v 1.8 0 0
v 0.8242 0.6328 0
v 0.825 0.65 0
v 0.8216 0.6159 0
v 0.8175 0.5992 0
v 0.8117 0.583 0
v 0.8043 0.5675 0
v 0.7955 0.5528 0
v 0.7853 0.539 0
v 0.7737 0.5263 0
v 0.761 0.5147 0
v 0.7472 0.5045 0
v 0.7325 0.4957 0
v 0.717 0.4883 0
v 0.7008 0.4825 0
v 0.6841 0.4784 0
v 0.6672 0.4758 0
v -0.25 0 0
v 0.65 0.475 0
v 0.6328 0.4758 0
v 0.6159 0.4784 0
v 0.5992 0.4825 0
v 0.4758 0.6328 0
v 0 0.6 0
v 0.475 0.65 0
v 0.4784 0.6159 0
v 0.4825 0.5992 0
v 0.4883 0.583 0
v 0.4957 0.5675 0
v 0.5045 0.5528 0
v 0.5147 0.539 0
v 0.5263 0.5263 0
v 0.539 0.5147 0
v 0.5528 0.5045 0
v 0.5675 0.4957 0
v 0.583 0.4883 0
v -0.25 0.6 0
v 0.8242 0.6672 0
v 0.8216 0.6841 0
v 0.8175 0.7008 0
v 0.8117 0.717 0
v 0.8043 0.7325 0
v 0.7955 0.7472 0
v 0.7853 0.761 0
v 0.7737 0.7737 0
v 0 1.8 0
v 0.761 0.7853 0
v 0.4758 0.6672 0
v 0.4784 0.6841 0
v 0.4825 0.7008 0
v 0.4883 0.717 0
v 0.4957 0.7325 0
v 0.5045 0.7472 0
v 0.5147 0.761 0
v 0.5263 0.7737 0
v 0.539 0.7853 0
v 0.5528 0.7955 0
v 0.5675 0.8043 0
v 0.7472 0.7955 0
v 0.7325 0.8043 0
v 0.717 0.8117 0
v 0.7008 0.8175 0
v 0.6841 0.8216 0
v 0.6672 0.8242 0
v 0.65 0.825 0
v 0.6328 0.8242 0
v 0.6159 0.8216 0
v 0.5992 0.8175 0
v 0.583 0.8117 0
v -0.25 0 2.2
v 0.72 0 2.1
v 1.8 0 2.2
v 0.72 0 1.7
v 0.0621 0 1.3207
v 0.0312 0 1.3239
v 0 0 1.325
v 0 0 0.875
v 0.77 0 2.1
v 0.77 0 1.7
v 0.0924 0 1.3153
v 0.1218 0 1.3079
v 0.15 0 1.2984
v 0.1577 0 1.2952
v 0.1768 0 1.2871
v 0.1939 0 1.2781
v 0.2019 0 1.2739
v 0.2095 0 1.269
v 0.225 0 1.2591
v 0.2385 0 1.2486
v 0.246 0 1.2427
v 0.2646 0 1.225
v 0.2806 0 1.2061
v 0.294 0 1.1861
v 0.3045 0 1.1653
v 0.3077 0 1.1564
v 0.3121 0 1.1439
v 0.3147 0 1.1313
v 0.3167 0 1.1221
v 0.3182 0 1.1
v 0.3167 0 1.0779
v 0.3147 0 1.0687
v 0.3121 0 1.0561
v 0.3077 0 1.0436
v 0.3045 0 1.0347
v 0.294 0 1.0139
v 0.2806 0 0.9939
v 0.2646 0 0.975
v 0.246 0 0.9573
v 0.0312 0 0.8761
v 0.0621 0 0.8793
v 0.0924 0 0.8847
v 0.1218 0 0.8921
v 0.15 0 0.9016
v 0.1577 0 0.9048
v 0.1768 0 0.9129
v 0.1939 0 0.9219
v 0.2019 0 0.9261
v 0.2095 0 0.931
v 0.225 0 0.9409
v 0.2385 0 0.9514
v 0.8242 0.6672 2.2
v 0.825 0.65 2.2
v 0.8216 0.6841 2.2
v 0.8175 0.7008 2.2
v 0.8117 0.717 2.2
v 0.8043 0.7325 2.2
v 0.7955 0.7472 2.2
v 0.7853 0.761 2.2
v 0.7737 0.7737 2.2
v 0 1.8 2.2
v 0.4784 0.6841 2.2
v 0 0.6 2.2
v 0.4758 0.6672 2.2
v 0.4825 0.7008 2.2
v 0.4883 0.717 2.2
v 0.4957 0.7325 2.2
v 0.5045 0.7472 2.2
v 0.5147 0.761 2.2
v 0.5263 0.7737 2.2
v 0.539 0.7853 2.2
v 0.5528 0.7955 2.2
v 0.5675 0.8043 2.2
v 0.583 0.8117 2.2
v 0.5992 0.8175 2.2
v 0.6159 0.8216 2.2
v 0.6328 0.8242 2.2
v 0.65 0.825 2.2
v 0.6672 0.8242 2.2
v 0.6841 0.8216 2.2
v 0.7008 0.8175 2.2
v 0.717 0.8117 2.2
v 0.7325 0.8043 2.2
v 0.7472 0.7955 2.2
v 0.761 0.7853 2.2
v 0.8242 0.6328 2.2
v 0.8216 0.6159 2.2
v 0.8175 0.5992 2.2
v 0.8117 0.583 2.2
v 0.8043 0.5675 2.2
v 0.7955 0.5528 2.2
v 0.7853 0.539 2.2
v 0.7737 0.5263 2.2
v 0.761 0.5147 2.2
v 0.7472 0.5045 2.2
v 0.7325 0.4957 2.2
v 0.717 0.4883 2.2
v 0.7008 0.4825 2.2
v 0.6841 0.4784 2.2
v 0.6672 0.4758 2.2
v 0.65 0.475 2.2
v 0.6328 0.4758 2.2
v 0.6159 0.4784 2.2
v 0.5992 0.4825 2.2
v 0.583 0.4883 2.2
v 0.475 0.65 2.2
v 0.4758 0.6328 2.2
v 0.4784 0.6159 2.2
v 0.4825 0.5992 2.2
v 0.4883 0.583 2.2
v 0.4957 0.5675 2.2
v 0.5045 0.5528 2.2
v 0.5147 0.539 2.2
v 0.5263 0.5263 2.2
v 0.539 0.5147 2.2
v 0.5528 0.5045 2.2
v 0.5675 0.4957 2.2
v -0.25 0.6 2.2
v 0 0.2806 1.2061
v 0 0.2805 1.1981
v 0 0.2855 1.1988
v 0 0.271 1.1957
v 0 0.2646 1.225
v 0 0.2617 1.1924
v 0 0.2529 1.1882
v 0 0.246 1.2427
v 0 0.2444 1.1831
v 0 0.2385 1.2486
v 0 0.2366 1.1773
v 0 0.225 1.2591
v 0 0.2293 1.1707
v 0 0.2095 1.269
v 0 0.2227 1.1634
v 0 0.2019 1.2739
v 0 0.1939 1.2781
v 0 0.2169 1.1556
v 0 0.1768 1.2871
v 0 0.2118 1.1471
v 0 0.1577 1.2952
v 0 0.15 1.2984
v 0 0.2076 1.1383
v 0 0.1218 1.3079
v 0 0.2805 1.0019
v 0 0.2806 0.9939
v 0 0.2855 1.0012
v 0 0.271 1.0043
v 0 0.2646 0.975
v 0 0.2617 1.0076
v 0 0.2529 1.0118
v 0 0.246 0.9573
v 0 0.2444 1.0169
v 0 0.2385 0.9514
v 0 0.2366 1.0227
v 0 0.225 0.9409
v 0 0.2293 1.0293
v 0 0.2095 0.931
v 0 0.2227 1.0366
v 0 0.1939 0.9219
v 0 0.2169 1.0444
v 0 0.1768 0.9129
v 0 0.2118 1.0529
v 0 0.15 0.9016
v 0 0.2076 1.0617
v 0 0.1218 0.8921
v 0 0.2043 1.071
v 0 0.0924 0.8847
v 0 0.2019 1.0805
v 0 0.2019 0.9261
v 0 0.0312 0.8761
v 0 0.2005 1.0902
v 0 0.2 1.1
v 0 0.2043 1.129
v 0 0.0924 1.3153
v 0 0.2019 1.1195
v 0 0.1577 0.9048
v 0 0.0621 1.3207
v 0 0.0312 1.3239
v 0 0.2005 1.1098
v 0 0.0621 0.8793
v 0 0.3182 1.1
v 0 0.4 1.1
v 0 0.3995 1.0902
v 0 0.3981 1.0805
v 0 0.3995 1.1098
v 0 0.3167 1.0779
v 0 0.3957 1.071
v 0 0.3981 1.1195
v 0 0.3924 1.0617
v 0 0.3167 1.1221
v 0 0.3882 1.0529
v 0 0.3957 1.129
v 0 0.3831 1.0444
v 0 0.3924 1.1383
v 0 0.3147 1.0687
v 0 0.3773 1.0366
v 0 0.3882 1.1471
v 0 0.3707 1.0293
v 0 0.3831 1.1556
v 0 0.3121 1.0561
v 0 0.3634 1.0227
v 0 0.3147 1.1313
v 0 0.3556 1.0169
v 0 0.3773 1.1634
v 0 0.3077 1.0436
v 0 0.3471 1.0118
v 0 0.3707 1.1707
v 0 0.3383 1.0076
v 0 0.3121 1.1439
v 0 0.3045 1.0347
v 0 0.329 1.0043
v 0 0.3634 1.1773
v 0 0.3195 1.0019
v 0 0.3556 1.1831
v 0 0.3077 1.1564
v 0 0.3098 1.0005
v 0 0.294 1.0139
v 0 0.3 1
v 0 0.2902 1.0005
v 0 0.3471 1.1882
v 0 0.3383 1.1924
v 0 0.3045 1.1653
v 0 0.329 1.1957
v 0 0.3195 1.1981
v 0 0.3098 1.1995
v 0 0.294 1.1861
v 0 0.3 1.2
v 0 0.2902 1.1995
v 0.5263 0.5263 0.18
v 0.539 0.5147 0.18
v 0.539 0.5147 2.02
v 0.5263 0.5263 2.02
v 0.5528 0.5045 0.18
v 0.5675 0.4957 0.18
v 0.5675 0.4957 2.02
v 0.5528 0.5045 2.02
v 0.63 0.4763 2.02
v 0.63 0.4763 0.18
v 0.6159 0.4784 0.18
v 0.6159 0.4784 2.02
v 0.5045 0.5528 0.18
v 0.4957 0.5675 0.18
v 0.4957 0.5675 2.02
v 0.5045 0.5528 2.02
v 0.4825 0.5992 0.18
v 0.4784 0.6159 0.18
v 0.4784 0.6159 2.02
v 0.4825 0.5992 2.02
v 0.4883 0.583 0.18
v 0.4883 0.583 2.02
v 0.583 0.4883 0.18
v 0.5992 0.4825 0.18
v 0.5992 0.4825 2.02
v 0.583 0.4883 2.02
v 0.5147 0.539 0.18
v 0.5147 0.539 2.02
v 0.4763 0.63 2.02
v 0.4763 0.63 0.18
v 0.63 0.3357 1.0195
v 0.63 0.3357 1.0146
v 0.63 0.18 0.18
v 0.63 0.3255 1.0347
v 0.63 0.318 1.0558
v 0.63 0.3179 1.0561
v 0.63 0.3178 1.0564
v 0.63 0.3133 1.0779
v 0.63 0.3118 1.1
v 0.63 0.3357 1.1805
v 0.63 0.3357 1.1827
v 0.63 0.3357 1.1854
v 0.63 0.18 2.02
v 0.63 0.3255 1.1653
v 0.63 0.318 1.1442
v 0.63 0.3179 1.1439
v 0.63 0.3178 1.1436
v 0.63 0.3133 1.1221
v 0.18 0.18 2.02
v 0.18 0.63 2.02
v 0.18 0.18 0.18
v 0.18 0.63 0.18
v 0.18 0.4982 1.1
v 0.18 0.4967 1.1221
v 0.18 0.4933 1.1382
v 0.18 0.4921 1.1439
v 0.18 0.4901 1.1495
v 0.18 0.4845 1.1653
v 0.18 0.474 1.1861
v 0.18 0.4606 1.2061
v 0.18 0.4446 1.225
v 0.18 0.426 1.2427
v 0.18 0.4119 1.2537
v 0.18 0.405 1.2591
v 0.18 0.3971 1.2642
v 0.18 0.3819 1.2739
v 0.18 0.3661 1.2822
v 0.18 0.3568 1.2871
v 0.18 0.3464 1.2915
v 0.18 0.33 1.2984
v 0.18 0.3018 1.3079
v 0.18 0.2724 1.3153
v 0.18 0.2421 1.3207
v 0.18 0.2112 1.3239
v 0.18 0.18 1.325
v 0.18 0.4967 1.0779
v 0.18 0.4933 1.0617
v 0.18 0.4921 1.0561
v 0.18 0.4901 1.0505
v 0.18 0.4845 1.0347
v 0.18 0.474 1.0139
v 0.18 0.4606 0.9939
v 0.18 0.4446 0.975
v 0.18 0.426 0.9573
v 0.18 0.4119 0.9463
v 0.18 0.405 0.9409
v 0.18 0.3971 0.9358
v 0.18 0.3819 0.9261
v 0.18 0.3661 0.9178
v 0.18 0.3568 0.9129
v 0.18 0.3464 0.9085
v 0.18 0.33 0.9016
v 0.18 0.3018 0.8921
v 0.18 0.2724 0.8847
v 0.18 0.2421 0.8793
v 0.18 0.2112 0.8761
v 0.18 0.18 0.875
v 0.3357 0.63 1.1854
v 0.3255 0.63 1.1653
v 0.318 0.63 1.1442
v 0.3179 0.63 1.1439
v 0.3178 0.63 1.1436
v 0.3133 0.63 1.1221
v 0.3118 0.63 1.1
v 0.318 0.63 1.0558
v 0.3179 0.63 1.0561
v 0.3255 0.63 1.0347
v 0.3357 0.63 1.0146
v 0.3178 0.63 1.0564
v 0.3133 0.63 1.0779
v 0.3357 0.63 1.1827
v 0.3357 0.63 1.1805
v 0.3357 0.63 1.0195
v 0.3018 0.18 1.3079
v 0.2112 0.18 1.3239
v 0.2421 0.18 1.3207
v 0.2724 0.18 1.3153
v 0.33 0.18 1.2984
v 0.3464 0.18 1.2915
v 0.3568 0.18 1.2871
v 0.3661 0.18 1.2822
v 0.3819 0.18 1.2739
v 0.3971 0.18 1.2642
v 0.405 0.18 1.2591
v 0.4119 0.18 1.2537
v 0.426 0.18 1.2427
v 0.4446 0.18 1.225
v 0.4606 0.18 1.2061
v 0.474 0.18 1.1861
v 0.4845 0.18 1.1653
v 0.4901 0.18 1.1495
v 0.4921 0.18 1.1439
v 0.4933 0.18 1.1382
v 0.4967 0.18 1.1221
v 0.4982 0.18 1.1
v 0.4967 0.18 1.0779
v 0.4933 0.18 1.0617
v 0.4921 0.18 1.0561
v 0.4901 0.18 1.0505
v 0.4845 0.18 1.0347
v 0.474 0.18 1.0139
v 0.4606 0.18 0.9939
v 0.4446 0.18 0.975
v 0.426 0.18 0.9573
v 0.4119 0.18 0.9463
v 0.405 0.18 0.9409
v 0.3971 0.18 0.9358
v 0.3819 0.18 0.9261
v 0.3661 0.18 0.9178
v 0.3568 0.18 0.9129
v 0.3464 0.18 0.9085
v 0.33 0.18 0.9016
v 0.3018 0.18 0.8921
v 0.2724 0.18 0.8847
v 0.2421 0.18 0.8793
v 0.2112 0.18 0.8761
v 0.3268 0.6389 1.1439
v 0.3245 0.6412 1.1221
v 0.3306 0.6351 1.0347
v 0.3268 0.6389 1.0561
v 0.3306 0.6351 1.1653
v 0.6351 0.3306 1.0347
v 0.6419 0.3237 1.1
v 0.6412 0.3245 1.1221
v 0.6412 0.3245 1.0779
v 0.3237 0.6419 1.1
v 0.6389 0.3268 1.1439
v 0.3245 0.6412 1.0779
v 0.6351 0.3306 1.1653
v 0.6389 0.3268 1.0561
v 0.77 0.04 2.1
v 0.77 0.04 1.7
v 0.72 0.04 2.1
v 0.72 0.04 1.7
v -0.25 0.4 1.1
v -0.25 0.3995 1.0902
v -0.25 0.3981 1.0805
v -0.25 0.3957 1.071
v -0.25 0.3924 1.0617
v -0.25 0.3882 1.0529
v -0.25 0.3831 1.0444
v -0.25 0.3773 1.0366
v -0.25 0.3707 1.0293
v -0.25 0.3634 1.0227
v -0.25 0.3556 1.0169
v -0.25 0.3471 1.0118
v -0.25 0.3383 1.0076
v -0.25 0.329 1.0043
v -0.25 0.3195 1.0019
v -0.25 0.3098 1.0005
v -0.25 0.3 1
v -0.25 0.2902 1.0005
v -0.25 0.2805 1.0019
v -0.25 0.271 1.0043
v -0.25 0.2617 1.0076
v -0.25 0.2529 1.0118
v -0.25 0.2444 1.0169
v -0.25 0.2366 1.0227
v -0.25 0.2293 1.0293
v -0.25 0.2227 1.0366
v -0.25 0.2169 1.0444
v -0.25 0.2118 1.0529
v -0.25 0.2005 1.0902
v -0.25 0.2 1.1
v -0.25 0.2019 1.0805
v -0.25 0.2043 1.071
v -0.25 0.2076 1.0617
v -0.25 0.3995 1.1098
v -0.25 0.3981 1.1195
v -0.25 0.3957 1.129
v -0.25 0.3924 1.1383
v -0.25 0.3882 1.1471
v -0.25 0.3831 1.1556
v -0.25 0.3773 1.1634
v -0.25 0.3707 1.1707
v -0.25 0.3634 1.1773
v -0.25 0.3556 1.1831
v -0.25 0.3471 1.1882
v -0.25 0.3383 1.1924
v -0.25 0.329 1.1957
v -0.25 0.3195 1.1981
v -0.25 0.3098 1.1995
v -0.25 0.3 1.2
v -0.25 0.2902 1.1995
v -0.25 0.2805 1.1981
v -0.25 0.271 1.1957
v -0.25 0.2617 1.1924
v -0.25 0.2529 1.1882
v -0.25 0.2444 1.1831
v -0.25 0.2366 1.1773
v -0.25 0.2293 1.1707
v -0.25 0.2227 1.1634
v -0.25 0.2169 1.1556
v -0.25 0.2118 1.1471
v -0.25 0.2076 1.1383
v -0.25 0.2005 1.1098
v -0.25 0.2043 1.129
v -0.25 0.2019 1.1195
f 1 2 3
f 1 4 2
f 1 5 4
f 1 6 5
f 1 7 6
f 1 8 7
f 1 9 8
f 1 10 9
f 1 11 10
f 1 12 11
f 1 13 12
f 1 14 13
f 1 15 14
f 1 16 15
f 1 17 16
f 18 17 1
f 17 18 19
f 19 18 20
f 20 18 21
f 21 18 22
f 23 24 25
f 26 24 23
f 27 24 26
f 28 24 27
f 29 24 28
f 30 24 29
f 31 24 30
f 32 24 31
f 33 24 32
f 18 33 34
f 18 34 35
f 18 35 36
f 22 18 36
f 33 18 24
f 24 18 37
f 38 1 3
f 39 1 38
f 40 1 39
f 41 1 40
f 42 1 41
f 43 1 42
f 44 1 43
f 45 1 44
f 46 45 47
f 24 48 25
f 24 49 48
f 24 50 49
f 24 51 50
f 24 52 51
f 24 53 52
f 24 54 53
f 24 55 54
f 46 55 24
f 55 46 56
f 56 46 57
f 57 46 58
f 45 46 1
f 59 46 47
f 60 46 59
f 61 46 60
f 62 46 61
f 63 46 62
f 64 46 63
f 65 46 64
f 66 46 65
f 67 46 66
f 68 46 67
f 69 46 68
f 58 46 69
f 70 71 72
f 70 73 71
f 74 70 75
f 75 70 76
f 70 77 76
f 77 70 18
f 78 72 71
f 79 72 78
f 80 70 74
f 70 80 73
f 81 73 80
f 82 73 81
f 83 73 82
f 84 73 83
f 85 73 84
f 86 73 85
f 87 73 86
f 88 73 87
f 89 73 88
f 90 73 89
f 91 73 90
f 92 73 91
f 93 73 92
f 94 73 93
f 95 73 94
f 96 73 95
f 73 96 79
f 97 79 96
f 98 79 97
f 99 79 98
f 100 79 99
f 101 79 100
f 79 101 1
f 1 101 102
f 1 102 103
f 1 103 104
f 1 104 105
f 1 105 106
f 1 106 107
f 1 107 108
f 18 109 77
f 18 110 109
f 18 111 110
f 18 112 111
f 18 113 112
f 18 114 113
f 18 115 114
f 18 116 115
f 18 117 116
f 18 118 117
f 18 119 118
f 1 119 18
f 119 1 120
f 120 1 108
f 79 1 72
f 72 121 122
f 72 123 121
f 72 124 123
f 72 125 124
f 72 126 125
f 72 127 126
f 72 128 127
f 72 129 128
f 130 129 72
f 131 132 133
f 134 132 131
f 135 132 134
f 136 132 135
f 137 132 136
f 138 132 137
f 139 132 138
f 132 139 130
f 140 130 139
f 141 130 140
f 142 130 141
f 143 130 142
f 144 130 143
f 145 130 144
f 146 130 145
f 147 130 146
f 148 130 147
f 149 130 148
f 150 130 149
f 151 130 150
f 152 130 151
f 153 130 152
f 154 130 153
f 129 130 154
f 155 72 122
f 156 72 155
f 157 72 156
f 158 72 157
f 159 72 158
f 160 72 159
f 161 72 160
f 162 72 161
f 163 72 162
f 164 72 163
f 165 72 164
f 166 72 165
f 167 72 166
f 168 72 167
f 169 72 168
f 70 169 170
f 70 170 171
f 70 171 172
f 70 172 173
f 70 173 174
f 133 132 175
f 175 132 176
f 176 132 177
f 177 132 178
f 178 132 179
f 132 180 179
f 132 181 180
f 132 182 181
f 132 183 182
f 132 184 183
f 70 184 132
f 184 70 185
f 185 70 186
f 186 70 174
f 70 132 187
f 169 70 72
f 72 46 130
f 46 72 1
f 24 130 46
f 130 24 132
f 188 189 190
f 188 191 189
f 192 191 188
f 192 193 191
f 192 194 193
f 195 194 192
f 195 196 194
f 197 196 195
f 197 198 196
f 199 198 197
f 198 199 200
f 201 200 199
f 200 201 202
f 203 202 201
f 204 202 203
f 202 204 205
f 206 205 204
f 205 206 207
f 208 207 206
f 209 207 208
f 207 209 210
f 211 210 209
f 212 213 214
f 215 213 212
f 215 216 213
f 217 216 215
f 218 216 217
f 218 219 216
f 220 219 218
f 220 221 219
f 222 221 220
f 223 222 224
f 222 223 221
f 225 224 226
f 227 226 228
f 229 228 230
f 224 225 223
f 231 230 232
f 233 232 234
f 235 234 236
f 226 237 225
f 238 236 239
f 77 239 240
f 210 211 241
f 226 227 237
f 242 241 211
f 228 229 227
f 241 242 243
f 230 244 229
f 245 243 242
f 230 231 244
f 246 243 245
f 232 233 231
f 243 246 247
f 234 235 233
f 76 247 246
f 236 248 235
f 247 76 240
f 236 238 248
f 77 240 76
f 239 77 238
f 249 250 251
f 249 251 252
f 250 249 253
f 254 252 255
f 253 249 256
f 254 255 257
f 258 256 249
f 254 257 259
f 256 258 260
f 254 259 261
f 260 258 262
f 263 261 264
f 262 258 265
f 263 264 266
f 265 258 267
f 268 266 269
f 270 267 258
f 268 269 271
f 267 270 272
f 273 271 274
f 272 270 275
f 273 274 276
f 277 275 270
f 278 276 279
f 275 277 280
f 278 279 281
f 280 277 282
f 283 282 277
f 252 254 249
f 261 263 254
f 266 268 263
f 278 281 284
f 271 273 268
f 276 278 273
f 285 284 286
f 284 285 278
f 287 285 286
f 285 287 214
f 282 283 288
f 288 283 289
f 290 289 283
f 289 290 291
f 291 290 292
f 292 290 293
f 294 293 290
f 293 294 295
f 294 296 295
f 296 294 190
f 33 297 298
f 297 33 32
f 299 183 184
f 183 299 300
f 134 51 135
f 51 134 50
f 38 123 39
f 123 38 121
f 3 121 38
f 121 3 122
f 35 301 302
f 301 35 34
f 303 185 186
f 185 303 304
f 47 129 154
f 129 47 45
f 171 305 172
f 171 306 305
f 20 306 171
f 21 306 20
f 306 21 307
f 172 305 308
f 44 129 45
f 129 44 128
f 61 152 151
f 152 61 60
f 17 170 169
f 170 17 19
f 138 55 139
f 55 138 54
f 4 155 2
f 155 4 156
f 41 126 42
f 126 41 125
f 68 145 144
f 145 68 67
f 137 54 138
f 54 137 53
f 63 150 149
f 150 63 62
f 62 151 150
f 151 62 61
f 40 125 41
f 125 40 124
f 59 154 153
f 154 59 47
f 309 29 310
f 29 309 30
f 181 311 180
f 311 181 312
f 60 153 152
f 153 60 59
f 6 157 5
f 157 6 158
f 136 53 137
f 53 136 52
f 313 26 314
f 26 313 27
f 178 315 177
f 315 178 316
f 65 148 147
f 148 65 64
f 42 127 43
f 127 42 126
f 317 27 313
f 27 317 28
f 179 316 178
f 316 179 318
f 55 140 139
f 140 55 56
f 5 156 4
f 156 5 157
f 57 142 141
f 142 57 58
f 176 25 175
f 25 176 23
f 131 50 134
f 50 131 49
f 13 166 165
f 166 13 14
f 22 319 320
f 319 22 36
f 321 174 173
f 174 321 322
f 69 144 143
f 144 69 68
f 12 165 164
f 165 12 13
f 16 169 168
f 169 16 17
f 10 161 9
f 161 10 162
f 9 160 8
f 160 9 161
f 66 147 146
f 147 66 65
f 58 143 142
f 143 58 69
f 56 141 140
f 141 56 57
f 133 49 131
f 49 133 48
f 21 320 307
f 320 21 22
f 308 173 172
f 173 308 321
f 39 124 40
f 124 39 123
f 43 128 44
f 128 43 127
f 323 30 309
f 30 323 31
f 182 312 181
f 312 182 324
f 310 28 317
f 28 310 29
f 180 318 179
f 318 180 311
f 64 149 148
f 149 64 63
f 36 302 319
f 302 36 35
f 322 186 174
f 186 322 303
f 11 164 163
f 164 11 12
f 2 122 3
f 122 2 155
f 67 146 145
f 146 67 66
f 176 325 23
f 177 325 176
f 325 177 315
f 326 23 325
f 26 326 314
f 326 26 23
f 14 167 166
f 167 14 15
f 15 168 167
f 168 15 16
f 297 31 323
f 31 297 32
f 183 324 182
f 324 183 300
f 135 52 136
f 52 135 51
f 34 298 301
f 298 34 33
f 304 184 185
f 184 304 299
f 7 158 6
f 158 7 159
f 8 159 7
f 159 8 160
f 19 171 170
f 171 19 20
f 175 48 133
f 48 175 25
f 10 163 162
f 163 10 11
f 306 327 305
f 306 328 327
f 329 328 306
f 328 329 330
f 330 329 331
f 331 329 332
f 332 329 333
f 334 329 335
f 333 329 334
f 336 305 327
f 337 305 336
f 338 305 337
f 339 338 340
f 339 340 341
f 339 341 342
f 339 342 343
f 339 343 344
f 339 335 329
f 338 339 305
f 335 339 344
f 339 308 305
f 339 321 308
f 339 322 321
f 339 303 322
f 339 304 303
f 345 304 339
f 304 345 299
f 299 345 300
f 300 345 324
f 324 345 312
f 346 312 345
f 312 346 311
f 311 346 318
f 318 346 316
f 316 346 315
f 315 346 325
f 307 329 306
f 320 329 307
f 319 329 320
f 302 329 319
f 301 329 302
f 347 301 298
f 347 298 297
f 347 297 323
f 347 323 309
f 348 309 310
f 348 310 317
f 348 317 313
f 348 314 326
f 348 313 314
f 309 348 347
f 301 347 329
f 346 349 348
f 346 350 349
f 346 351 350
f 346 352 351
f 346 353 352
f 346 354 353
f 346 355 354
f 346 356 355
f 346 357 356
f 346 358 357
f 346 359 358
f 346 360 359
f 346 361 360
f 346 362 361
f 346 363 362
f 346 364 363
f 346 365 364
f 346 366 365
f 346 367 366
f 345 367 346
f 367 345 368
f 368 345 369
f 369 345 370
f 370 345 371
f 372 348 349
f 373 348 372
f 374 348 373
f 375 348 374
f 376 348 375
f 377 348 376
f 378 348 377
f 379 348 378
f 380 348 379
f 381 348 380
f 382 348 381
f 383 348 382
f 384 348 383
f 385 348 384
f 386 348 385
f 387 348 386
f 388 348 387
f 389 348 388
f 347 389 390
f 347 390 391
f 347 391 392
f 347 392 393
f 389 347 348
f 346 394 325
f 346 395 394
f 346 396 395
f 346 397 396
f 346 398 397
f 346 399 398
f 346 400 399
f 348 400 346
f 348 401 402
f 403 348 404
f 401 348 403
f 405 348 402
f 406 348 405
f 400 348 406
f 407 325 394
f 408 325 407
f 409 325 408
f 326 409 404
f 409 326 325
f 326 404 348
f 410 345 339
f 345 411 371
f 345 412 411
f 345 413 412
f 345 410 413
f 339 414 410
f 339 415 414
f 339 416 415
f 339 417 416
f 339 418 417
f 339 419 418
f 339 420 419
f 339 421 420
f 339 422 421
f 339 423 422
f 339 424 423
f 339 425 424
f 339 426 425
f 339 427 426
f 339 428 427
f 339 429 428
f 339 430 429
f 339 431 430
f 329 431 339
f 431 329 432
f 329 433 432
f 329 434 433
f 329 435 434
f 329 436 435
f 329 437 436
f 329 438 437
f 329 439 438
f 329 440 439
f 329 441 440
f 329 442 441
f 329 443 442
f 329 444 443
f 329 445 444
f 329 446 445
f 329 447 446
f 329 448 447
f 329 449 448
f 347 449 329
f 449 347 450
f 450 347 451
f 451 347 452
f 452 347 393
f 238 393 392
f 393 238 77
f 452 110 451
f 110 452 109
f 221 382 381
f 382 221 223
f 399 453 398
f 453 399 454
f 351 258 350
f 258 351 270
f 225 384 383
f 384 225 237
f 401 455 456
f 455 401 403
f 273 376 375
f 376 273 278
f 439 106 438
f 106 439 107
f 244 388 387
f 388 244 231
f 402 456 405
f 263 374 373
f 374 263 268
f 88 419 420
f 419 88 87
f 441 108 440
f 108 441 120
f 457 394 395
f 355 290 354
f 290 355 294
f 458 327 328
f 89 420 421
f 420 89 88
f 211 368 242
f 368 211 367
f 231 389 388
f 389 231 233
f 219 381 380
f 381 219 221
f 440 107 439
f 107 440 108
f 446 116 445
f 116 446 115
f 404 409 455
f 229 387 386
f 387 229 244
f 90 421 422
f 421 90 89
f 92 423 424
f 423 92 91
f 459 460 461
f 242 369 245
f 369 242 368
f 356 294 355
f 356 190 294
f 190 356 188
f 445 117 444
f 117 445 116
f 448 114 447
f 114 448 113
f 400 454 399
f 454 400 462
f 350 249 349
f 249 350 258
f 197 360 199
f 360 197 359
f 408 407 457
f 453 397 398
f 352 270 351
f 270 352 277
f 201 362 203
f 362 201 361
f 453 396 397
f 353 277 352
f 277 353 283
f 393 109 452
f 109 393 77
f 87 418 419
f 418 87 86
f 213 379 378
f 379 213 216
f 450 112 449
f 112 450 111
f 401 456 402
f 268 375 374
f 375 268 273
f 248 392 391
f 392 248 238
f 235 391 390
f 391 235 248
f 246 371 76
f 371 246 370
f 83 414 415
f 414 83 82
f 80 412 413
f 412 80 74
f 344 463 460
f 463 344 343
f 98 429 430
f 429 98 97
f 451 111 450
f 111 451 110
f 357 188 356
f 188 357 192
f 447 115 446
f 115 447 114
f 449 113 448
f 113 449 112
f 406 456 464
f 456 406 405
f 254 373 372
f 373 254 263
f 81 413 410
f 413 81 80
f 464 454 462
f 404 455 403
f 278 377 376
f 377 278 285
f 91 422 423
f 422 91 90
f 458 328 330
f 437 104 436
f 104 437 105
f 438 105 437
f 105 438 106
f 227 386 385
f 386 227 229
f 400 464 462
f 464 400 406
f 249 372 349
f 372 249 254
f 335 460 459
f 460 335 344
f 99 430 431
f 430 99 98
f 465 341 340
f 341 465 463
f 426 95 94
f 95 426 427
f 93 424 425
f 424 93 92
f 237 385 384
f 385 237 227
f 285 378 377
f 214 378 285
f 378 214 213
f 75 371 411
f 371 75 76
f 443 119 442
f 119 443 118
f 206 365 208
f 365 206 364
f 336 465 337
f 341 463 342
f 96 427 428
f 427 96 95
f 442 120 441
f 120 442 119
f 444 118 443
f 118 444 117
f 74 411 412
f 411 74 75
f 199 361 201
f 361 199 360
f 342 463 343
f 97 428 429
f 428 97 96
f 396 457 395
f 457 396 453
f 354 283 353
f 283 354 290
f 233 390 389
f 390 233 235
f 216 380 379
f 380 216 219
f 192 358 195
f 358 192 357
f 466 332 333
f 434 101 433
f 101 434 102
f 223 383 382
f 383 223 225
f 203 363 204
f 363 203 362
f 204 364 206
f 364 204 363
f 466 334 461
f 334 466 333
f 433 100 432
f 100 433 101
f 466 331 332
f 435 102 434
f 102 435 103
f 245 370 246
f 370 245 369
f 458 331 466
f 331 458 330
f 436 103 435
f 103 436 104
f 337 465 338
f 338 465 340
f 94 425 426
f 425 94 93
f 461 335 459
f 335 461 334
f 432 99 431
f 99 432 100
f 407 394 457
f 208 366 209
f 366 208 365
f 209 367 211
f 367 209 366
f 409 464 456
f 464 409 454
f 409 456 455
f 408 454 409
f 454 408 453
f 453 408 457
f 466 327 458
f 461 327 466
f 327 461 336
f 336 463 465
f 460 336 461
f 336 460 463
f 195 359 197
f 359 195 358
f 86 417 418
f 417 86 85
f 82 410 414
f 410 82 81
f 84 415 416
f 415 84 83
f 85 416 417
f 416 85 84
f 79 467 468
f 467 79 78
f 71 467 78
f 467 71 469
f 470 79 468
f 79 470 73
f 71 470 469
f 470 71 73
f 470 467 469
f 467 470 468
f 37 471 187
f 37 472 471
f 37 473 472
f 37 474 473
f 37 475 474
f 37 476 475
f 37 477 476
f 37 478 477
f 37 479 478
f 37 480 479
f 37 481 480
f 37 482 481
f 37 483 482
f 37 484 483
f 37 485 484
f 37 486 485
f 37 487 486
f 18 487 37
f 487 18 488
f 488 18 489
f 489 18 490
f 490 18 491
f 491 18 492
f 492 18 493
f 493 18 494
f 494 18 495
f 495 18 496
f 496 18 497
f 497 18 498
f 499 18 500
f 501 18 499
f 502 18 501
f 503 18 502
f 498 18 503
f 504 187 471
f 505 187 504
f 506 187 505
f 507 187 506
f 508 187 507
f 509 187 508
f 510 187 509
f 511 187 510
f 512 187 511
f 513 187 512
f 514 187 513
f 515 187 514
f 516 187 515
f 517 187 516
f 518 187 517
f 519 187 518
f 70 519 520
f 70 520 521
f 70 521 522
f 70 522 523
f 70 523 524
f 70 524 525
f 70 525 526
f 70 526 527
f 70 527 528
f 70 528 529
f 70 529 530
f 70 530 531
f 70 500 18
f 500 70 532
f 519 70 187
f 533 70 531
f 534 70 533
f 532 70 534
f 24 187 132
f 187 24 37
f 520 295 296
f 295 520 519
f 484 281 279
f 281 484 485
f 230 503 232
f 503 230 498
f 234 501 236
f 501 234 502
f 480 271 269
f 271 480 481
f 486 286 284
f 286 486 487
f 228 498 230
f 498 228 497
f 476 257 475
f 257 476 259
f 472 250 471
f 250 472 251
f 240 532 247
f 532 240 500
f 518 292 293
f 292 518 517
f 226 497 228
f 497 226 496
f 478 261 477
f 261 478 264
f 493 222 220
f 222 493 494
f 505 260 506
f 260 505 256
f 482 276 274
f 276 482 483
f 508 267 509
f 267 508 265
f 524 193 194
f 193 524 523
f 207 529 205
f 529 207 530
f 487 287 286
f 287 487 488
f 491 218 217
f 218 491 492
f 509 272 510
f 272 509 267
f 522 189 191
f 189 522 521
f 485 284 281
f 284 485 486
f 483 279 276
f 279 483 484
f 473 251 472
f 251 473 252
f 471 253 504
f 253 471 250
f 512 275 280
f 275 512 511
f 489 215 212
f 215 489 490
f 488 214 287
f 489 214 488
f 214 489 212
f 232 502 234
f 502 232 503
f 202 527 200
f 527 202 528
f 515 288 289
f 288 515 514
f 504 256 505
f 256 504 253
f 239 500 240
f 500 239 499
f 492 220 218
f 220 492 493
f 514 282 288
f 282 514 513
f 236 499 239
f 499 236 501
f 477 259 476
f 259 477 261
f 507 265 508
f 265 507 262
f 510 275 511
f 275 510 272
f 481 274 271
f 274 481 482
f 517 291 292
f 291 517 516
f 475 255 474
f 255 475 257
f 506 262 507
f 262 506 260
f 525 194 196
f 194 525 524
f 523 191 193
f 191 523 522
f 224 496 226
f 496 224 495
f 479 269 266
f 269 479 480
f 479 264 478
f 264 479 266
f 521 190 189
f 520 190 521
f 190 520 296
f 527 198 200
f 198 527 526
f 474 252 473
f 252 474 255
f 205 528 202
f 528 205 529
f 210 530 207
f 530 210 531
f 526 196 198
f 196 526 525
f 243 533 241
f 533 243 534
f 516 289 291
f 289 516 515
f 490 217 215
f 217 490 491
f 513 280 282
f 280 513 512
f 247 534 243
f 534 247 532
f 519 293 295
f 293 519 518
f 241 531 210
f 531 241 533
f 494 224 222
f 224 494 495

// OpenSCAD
// FireWatch Industrial Infrastructure - Pneumatic Gel-Capsule Suppression Launcher
$fn = 64; 

// Structural Form Factors (Reinforced for Pneumatic Pressure Containment)
block_width     = 1.80; // Inches (Enlarged chassis body)
block_height    = 1.80; 
block_length    = 2.20; // Extended length for the pneumatic launch cylinder
wall_thick      = 0.18; // 4.5mm thick impact-modified walls
barrel_diameter = 0.35; // Internal bore diameter sized for the hard shell gel capsule (~9mm/.35")

module gel_suppression_launcher() {
    difference() {
        // 1. Primary Ruggedized Body (Standard Fire Red High-Impact Polymer)
        linear_extrude(height = block_length) {
            polygon(points=[[0,0], [block_width,0], [0,block_height]]);
        }
        
        // 2. Smooth-Bore Launch Cylinder (Chamber for the hard plastic gel capsule)
        // Positioned at a 45-degree angle to point downward from ceiling corners
        translate([0.65, 0.65, -0.05])
            cylinder(h = block_length + 0.1, d = barrel_diameter);
            
        // 3. Recessed Valve Compartment (Nests the electromechanical solenoid valve)
        translate([wall_thick, wall_thick, wall_thick])
            cube([0.45, 0.45, block_length - (wall_thick * 2)]);
            
        // 4. IP67 Waterproof Power/Control Bulkhead Port
        translate([0.20, 0.20, block_length / 2])
            rotate([0, 90, 45])
                cylinder(h = 0.8, d = 0.45, center=true); // Sized for waterproof solenoid control wiring
                
        // 5. Exterior Mechanical Alignment Notch (Sightline reference for the camera)
        translate([block_width * 0.4, -0.01, block_length - 0.5])
            cube([0.05, 0.05, 0.4]);
    }
    
    // 6. External Heavy-Duty Load-Bearing Flanges (For flush ceiling/wall anchoring)
    translate([-0.25, 0, 0])
        difference() {
            cube([0.25, 0.60, block_length]);
            translate([0.12, 0.30, block_length / 2])
                rotate([0, 90, 0])
                    cylinder(h = 0.6, d = 0.20, center=true); // Pass-through for heavy-gauge anchor screws
        }
}

gel_suppression_launcher();
